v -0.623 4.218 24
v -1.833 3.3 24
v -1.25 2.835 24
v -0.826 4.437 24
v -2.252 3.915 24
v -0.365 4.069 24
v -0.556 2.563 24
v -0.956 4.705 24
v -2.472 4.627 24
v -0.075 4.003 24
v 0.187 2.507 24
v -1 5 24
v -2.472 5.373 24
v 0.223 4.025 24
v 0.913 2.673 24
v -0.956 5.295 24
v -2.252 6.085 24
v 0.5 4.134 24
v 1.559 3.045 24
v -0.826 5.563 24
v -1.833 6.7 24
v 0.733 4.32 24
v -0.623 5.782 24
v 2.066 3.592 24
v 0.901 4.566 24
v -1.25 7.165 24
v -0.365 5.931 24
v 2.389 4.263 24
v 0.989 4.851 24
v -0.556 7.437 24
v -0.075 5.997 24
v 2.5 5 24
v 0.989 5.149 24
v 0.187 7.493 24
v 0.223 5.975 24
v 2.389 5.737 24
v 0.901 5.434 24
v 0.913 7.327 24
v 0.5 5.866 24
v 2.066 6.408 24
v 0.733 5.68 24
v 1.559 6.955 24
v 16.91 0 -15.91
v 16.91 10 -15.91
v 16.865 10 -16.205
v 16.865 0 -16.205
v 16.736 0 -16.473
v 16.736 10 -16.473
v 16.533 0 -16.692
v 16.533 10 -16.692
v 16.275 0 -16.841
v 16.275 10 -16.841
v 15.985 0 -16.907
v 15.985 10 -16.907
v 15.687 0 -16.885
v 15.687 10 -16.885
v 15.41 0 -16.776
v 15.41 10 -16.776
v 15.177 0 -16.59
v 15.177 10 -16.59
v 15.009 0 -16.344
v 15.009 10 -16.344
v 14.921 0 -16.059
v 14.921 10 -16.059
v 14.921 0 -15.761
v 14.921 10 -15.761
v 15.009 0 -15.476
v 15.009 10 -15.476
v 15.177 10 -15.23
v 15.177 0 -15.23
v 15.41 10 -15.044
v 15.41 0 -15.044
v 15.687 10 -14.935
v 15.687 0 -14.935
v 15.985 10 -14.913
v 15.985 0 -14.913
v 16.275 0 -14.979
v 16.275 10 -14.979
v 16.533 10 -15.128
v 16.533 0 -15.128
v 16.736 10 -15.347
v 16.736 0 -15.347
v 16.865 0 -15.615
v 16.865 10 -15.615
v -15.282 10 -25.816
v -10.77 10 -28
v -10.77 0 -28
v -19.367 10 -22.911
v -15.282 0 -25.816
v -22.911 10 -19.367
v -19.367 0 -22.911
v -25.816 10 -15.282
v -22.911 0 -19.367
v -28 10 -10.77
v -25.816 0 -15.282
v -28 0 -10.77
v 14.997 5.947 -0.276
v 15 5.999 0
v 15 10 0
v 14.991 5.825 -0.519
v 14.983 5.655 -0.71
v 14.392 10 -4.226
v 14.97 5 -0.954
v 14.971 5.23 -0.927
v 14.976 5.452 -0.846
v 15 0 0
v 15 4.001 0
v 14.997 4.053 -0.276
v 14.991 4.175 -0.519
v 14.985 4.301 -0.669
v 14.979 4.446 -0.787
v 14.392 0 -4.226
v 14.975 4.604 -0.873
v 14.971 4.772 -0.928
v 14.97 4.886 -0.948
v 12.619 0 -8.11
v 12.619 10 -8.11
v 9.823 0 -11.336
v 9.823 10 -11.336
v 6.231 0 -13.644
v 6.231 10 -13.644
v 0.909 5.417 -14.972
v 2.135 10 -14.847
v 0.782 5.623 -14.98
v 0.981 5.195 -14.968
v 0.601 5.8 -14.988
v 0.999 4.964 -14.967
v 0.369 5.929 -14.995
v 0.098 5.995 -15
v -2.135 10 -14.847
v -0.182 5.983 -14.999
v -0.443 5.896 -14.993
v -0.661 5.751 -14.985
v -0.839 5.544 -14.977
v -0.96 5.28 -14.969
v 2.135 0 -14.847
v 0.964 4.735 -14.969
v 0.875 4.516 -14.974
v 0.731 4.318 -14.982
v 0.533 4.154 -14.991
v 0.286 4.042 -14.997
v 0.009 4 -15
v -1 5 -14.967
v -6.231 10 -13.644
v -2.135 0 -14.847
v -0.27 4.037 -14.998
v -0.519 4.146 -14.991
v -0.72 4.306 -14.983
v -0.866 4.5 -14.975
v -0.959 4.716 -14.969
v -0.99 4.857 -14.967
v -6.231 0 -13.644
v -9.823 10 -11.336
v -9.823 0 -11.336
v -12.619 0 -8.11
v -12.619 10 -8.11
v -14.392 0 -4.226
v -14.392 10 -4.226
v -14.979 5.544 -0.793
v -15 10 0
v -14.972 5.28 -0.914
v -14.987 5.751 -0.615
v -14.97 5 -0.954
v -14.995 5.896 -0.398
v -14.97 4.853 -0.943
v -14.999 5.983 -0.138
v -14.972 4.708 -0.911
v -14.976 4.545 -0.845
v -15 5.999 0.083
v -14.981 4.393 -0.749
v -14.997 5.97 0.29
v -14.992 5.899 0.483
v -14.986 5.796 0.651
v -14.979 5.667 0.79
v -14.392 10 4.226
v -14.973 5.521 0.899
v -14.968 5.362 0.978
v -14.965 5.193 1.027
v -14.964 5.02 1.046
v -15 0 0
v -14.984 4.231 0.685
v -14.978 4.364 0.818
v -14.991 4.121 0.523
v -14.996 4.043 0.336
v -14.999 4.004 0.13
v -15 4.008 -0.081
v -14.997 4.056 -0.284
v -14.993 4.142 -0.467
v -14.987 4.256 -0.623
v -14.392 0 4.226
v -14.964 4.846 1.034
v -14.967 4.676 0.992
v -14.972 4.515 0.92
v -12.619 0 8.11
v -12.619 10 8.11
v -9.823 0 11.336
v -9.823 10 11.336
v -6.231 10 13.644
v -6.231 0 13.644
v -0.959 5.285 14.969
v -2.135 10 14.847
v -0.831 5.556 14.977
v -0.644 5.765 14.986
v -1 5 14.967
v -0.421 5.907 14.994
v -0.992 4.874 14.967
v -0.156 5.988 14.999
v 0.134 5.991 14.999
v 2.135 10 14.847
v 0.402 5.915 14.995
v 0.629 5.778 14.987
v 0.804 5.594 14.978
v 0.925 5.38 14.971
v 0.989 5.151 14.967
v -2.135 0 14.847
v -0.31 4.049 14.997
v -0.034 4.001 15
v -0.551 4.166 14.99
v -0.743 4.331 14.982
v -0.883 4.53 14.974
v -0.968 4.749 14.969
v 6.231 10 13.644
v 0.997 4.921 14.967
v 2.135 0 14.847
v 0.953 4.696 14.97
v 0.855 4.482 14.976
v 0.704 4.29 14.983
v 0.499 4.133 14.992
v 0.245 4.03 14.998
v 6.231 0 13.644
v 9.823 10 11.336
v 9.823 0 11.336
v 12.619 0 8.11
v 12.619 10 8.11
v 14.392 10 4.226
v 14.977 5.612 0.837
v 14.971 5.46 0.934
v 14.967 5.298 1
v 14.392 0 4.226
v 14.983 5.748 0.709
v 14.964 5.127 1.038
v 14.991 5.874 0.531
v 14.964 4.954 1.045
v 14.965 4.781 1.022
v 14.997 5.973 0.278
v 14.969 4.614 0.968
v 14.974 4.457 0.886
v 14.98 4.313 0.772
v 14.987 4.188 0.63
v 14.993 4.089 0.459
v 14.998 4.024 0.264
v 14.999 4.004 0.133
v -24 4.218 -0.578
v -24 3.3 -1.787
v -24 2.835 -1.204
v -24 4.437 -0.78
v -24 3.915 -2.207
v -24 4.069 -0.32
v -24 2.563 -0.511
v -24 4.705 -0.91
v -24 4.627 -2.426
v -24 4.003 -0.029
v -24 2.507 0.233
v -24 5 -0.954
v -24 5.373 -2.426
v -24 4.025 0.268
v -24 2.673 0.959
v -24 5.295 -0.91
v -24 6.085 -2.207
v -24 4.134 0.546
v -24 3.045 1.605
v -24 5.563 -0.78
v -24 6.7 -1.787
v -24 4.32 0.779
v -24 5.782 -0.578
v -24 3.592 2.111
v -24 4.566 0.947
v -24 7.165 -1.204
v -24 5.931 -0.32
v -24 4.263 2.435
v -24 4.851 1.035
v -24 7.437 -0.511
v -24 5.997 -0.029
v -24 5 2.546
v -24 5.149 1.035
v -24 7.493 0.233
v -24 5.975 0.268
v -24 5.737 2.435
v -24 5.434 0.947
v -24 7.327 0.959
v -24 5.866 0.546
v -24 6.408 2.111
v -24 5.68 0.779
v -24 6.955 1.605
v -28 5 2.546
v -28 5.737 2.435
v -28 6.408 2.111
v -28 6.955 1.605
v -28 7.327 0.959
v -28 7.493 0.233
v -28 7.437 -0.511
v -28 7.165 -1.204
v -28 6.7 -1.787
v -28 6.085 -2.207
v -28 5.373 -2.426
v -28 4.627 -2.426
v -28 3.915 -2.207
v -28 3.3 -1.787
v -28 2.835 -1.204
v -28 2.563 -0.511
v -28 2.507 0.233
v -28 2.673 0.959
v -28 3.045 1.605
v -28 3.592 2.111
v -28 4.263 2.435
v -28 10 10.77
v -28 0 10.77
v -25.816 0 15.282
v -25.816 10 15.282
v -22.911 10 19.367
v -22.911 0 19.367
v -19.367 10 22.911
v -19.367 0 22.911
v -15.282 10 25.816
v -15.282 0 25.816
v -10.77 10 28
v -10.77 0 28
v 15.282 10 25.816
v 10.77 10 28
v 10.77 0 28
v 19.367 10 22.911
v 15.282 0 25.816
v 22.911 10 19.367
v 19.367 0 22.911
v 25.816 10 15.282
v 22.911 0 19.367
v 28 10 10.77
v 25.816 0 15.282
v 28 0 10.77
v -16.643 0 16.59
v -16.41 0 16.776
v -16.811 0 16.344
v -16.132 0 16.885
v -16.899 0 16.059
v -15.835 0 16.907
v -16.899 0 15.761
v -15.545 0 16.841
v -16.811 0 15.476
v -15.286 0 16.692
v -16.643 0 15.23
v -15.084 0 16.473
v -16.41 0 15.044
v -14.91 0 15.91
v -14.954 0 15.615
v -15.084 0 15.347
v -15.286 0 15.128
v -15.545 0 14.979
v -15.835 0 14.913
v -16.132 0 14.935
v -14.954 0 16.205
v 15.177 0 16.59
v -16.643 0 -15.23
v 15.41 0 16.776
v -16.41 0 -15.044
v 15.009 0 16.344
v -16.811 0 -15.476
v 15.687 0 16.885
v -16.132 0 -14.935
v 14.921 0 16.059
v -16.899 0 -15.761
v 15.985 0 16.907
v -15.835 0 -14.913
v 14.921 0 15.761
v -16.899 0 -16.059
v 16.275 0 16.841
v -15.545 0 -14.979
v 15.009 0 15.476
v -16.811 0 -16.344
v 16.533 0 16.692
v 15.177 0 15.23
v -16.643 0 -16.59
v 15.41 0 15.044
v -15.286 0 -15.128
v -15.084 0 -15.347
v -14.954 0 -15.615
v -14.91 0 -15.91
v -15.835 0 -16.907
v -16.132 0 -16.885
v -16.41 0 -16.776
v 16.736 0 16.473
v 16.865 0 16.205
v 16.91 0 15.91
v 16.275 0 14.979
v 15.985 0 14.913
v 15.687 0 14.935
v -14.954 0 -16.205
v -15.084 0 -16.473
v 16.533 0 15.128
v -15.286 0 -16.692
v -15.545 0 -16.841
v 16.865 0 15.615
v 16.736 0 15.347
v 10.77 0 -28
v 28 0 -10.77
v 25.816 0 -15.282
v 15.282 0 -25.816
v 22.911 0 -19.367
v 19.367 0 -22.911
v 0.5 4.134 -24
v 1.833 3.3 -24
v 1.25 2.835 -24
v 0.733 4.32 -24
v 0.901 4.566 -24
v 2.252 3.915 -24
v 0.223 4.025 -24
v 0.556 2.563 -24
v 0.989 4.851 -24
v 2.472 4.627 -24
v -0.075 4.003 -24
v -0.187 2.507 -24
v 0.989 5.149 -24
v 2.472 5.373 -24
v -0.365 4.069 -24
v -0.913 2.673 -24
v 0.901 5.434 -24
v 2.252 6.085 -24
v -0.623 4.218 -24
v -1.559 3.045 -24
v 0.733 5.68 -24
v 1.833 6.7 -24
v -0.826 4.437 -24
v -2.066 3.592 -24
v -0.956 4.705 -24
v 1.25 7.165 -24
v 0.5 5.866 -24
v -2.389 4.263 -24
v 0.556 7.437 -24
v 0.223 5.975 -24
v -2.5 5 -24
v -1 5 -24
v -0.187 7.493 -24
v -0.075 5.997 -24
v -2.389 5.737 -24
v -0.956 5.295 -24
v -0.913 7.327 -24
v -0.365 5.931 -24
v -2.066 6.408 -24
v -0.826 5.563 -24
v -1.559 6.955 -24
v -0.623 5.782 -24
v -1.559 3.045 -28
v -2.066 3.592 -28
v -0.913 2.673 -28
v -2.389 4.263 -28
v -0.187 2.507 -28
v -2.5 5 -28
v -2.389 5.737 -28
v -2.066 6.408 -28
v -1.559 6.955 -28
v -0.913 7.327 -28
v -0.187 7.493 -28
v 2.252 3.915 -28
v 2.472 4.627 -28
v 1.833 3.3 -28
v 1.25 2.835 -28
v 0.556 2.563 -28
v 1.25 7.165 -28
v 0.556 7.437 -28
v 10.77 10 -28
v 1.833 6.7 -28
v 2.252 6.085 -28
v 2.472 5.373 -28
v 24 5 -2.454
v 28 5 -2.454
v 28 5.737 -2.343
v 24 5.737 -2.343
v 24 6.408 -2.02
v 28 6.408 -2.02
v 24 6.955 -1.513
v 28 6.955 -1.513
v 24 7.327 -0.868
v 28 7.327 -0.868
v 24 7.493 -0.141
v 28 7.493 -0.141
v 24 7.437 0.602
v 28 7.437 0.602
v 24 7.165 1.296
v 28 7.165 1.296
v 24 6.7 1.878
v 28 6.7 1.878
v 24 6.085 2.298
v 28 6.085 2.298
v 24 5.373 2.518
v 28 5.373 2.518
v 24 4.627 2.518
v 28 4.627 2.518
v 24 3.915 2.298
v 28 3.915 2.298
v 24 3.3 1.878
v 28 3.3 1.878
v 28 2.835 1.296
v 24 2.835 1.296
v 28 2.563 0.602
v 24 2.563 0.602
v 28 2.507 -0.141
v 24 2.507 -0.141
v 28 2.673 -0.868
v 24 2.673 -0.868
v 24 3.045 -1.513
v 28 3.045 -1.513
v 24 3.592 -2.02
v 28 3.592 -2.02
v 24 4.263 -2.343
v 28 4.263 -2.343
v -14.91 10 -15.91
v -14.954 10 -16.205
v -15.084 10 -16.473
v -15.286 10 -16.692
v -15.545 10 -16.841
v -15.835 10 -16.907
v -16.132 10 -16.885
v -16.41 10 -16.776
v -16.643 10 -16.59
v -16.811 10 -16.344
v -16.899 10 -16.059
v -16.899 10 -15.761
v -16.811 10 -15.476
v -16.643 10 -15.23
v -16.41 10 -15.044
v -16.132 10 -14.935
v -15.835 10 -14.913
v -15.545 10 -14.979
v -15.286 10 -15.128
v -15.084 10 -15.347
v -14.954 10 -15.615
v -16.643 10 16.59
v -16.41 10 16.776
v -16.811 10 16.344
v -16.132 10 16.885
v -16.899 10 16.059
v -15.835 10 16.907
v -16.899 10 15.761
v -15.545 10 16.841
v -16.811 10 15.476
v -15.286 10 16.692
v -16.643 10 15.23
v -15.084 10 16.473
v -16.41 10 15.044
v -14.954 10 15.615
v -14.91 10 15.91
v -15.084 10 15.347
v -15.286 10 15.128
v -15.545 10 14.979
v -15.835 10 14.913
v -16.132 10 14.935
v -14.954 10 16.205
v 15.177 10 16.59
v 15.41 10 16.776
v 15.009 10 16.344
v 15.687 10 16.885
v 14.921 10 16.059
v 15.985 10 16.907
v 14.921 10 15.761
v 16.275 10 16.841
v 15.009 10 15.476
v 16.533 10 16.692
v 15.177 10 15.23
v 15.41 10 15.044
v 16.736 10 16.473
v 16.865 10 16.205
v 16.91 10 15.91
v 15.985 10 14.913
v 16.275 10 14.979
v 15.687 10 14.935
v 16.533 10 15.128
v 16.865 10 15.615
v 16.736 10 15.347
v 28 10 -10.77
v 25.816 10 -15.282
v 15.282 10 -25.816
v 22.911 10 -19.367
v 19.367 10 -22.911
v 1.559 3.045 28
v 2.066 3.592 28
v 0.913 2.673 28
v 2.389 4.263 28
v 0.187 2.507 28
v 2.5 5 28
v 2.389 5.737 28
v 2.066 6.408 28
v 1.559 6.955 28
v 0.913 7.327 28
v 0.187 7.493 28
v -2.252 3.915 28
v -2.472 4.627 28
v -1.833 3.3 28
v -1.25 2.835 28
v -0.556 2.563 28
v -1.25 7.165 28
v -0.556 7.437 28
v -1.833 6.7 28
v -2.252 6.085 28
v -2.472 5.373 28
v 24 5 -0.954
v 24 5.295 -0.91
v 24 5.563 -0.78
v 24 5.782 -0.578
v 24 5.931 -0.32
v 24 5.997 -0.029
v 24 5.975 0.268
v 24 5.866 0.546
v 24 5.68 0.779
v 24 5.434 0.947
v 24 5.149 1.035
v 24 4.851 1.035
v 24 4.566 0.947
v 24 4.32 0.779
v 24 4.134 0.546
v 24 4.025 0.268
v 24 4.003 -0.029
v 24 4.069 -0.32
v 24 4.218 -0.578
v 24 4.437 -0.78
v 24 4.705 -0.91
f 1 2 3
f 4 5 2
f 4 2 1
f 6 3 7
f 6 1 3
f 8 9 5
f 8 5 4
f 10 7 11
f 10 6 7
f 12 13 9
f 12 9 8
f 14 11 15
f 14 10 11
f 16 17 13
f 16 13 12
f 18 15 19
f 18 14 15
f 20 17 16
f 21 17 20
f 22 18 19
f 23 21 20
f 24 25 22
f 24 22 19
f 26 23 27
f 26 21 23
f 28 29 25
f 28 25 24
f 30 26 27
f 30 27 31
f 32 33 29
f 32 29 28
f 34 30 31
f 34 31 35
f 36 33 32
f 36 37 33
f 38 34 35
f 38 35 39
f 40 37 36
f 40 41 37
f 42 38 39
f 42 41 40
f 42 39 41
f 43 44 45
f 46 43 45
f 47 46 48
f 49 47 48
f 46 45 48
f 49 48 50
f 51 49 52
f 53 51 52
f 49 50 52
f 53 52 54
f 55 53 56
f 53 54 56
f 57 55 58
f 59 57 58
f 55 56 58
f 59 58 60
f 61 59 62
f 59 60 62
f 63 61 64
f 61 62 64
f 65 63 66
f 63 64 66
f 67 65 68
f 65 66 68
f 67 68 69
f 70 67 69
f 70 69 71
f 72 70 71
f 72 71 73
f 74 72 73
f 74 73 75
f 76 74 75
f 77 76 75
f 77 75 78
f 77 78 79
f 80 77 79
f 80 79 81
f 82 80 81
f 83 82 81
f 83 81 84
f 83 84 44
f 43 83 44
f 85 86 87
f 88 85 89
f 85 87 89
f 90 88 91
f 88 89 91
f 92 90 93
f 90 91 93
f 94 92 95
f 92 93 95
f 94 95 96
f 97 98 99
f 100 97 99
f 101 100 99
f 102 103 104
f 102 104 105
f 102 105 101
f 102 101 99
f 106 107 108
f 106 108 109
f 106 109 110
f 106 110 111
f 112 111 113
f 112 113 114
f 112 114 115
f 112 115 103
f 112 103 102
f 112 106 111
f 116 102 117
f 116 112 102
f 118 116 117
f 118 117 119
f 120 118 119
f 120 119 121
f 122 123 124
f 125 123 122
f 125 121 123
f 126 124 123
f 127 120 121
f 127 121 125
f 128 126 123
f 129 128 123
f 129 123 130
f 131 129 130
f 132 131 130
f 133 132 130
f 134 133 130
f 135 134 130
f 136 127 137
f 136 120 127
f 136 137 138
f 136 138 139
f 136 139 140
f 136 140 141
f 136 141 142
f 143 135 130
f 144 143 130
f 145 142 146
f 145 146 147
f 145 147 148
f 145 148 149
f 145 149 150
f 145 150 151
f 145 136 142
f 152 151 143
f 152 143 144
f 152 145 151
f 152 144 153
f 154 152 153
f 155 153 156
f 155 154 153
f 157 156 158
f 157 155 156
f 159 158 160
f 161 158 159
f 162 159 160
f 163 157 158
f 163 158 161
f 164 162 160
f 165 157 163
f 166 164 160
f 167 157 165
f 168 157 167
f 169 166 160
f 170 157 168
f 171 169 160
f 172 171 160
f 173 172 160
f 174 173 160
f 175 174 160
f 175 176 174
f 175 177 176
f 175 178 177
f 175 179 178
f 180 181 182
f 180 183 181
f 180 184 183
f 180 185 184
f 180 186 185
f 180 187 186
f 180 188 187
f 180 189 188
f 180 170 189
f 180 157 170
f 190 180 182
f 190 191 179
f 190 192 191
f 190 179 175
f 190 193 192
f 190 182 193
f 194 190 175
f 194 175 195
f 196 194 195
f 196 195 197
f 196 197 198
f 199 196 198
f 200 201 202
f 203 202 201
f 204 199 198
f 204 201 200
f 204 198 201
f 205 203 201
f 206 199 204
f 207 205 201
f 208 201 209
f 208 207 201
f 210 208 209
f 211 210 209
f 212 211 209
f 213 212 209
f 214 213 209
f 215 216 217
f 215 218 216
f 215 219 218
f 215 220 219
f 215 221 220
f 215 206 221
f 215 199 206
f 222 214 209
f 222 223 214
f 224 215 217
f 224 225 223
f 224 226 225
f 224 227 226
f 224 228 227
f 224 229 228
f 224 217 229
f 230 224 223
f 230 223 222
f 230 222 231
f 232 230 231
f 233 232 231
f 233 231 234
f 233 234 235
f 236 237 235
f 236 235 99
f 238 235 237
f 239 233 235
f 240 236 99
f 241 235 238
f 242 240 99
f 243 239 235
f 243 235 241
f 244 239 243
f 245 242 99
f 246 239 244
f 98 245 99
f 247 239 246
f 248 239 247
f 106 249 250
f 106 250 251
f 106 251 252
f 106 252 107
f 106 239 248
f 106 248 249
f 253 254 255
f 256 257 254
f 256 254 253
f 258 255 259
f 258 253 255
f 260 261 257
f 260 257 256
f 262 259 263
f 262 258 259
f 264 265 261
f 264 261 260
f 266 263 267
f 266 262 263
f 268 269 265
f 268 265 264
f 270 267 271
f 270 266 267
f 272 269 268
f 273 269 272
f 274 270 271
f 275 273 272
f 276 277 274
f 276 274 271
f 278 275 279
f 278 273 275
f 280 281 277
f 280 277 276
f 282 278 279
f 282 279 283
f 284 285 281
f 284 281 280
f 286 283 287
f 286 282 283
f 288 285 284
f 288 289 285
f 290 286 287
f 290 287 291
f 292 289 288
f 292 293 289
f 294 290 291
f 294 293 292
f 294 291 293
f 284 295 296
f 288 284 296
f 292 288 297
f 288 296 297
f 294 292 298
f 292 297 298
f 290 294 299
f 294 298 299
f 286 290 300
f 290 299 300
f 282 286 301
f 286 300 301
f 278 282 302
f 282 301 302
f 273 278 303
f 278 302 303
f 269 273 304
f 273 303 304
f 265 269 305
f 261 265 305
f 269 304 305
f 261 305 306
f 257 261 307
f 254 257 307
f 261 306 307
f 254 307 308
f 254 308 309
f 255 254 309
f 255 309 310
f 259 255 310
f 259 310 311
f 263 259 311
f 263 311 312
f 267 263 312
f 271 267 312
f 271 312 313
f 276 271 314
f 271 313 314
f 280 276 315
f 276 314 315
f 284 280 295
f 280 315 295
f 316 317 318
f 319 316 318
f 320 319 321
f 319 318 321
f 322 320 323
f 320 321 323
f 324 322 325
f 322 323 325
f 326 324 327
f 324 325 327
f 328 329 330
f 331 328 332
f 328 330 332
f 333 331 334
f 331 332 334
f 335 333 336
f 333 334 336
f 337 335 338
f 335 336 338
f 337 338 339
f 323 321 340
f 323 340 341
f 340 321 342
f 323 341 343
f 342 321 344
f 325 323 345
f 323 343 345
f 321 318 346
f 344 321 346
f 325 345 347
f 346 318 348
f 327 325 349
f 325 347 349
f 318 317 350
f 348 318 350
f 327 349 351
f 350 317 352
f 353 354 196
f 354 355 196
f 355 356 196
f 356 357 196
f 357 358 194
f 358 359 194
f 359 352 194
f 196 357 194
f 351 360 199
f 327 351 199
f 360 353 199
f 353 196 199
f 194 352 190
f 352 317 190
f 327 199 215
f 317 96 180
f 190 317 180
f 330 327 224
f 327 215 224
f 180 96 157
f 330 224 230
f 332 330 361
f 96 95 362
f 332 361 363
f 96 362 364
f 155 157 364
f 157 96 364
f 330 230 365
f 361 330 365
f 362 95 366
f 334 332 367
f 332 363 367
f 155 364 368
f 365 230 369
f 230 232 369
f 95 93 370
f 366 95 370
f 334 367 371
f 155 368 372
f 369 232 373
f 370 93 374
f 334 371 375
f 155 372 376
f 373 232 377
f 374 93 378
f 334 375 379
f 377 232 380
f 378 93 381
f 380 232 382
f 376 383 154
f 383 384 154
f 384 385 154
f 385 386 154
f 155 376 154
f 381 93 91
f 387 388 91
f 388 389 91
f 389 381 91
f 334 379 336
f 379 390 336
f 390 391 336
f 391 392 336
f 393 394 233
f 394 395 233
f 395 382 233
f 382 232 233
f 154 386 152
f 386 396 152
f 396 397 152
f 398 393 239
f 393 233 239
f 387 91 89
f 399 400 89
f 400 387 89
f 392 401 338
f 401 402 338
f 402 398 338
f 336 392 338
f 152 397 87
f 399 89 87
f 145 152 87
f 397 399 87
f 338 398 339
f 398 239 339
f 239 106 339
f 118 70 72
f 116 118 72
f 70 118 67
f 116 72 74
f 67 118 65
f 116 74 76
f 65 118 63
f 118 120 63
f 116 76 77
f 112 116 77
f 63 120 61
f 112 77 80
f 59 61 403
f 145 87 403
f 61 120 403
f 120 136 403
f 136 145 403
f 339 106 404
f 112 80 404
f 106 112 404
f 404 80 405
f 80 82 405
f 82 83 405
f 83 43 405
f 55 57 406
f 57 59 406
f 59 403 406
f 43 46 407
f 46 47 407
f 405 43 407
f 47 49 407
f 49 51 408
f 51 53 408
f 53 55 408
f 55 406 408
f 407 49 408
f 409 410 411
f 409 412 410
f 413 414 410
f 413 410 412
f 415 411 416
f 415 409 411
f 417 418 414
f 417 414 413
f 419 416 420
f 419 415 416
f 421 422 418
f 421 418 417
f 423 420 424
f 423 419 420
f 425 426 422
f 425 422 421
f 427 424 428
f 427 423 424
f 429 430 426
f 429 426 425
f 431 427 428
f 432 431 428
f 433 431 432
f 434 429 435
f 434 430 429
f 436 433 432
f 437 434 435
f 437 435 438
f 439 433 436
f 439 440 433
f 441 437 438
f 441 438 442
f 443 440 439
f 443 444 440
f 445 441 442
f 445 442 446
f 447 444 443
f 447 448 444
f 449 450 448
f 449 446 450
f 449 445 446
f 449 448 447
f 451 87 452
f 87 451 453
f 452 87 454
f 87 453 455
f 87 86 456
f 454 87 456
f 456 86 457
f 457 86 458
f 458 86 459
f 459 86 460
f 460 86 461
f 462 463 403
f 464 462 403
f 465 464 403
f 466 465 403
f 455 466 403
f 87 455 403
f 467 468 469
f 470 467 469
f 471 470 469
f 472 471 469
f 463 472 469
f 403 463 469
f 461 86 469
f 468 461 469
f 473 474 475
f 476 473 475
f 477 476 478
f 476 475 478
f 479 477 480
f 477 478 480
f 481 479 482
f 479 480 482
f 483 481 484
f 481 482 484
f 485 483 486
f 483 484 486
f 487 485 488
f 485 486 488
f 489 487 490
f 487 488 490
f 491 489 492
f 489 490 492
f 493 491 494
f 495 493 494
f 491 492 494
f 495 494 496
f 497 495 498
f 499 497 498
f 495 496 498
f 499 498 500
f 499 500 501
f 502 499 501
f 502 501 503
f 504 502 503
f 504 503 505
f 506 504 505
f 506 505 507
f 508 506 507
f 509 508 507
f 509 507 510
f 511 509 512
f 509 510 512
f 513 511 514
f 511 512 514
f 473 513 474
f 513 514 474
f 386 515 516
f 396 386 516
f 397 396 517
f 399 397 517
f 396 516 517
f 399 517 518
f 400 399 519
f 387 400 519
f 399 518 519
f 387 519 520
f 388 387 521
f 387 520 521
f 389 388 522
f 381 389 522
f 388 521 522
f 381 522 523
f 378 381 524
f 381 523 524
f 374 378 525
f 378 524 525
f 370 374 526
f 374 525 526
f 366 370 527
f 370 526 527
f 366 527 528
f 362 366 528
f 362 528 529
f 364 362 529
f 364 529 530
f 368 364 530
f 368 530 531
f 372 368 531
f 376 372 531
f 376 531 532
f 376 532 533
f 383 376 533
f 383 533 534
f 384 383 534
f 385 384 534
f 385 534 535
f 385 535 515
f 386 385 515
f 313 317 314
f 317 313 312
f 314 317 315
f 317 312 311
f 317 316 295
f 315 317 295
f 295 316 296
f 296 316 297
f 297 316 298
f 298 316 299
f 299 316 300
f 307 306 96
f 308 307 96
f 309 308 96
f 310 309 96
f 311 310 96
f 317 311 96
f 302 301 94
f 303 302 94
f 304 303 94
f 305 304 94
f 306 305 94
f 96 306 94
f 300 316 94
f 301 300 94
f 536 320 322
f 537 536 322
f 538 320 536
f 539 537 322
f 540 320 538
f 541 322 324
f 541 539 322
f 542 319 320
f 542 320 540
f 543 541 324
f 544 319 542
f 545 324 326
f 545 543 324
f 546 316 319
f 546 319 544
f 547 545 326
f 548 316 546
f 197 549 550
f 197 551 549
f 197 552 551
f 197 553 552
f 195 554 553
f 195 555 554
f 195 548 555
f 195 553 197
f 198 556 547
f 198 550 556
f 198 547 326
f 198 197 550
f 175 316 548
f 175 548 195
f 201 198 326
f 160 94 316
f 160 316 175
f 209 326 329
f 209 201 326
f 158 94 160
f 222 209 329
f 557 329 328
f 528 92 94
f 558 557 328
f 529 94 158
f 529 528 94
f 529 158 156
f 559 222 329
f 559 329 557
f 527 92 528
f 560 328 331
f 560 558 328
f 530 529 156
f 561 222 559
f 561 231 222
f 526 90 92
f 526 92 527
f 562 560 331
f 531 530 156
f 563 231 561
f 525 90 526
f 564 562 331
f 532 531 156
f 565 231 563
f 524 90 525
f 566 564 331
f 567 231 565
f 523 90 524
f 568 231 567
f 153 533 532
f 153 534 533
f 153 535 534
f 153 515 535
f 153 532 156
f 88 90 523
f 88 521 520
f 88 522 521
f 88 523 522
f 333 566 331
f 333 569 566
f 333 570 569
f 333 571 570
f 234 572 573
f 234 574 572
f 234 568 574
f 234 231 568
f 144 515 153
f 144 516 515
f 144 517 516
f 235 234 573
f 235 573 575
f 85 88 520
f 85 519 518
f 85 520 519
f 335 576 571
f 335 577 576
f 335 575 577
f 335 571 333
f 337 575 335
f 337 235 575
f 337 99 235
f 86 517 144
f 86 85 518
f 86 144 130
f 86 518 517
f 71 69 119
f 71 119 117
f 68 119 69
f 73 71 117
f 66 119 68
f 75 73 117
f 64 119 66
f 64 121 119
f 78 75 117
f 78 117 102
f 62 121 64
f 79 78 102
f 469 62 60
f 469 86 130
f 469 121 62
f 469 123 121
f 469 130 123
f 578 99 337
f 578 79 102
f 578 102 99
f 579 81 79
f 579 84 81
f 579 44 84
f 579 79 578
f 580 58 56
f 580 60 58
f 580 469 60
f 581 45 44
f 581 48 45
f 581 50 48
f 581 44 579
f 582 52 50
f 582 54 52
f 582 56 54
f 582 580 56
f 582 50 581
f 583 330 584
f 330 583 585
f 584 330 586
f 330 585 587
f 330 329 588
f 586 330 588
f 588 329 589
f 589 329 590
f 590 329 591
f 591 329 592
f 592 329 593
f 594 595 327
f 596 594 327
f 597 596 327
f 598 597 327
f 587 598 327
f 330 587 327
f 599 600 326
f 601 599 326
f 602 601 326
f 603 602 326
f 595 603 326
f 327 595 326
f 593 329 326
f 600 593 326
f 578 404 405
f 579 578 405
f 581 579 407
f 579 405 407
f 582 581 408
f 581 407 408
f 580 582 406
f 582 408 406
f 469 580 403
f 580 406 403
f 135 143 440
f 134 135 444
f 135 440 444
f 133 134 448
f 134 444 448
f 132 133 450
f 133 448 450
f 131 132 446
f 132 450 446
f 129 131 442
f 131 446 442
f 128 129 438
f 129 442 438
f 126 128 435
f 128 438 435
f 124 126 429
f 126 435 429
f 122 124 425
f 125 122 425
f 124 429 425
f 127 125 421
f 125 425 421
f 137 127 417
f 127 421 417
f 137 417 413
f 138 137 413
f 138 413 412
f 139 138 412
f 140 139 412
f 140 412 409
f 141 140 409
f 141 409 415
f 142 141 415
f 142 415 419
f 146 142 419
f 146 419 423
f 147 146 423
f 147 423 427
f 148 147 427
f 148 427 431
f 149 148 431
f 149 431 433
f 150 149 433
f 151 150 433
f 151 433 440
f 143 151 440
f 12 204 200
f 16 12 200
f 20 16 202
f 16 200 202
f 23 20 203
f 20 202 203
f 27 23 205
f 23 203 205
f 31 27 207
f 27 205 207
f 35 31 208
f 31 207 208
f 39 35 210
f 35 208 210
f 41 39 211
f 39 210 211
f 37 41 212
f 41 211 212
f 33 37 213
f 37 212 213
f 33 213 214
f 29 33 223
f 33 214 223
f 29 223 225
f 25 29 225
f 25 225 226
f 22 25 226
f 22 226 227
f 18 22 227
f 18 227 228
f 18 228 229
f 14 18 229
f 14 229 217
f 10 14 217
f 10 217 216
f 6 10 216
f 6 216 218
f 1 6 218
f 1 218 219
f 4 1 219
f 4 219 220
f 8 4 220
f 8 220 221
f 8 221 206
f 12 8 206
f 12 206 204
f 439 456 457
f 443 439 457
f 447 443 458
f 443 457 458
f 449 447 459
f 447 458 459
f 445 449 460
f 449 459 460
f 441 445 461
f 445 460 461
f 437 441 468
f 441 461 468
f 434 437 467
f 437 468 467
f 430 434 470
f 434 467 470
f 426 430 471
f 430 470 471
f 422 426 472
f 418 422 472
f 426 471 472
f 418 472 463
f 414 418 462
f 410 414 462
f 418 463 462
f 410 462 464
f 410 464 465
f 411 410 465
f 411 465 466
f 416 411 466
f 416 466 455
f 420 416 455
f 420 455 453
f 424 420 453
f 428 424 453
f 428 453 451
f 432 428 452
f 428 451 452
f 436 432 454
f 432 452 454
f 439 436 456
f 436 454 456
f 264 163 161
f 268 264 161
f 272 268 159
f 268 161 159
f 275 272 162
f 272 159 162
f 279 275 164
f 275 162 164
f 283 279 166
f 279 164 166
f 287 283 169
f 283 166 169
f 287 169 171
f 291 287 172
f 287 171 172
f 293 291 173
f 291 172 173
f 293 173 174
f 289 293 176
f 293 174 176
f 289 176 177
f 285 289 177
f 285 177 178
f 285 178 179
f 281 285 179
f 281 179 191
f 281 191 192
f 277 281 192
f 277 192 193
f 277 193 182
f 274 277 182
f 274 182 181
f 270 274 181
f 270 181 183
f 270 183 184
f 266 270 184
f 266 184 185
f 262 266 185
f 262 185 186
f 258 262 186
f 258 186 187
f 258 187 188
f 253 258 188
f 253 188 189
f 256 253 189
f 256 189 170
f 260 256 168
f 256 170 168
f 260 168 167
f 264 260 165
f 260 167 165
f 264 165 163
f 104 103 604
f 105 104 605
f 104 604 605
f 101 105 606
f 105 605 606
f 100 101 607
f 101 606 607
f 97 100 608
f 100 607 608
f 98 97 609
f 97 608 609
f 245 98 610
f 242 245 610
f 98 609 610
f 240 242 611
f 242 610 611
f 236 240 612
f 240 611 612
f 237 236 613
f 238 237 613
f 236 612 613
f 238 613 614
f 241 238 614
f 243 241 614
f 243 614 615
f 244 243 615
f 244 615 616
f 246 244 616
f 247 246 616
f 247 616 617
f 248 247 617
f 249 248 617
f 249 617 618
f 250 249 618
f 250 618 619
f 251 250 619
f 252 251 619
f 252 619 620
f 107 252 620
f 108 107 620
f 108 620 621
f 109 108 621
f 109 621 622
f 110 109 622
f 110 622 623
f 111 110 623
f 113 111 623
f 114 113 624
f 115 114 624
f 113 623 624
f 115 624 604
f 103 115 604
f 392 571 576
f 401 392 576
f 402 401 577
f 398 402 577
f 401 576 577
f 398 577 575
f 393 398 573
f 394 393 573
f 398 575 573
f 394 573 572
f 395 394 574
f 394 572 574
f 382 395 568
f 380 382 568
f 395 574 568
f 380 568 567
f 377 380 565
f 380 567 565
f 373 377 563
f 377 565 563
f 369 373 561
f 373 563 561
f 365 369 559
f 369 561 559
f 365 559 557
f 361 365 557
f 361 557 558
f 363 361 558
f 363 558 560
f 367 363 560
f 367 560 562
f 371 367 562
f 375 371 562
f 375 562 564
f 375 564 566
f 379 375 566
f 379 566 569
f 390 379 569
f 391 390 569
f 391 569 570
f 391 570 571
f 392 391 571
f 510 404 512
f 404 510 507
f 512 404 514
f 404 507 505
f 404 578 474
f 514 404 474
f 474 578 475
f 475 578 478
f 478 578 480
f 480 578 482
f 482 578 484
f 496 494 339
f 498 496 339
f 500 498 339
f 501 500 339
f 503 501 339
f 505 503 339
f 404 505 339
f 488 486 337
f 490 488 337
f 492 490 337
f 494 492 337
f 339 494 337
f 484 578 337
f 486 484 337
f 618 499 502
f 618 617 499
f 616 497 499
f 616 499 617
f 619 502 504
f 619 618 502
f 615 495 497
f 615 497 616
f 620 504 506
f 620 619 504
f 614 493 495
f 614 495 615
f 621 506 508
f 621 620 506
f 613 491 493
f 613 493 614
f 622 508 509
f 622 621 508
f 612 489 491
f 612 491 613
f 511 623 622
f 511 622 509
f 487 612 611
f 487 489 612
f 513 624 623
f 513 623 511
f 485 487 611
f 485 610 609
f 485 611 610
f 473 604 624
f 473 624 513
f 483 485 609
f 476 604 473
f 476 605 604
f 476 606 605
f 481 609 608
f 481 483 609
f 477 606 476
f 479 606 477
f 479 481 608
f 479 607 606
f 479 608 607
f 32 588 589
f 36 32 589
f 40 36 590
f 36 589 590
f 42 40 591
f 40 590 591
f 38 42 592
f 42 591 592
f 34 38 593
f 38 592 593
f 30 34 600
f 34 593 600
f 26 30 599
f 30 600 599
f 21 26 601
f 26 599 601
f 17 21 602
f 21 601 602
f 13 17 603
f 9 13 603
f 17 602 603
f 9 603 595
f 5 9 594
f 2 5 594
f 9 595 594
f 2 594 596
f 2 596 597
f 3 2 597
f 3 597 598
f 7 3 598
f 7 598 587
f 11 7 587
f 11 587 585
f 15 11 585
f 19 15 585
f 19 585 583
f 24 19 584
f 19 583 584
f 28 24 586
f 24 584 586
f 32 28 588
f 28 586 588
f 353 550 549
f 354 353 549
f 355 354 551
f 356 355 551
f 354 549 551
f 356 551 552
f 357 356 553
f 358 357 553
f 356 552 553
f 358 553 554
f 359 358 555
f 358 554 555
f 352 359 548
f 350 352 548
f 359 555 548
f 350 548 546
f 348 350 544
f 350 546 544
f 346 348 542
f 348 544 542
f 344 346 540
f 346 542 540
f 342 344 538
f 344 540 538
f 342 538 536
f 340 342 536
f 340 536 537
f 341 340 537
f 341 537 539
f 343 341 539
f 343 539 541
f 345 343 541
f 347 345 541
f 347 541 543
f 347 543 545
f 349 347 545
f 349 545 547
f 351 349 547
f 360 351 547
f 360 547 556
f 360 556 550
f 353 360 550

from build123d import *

# Parameters (mm, degrees)
SKETCH1_R           = 30
SKETCH1_R_2         = 15
BOSS_EXTRUDE1_DEPTH = 10
CUT_EXTRUDE1_DEPTH  = 43
SKETCH4_R           = 1
CUT_EXTRUDE3_DEPTH  = 43
SKETCH5_R           = 1
CUT_EXTRUDE4_DEPTH  = 70
SKETCH6_R           = 1
CUT_EXTRUDE5_DEPTH  = 70
SKETCH8_R           = 2.5
CUT_EXTRUDE6_DEPTH  = 4
SKETCH9_R           = 2.5
SKETCH9_R_2         = 1
CUT_EXTRUDE7_DEPTH  = 4
SKETCH10_R          = 2.5
CUT_EXTRUDE8_DEPTH  = 4
SKETCH11_R          = 2.5
CUT_EXTRUDE9_DEPTH  = 4


with BuildPart() as part:
    # Sketch1 → Boss-Extrude1 (new body)
    with BuildSketch(Plane(origin=(0, 0, 0), x_dir=(1, 0, 0), z_dir=(0, 1, 0))):
        Circle(SKETCH1_R)
        Circle(SKETCH1_R_2, mode=Mode.SUBTRACT)
    extrude(amount=BOSS_EXTRUDE1_DEPTH)

    # Sketch2 → Cut-Extrude1 (cut)
    with BuildSketch(Plane(origin=(0, 10, 0), x_dir=(1, 0, 0), z_dir=(0, 1, 0))):
        with BuildLine():
            ThreePointArc((10.770329614, 28), (0, 30), (-10.770329614, 28))
            Line((-10.770329614, 28), (10.770329614, 28))
        make_face()
        with BuildLine():
            Line((-28, -10.770329614), (-28, 10.770329614))
            ThreePointArc((-28, 10.770329614), (-30, 0), (-28, -10.770329614))
        make_face()
        with BuildLine():
            ThreePointArc((30, 0), (29.495762408, 5.477225575), (28, 10.770329614))
            Line((28, 10.770329614), (28, -10.770329614))
            ThreePointArc((28, -10.770329614), (29.495762408, -5.477225575), (30, 0))
        make_face()
        with BuildLine():
            Line((10.770329614, -28), (-10.770329614, -28))
            ThreePointArc((-10.770329614, -28), (0, -30), (10.770329614, -28))
        make_face()
    extrude(amount=-CUT_EXTRUDE1_DEPTH, mode=Mode.SUBTRACT)

    # Sketch4 → Cut-Extrude3 (cut)
    with BuildSketch(Plane(origin=(0, 10, 0), x_dir=(1, 0, 0), z_dir=(0, 1, 0))):
        with Locations((15.909902577, -15.909902577)):
            Circle(SKETCH4_R)
        with Locations((-15.909902577, -15.909902577)):
            Circle(SKETCH4_R)
        with Locations((-15.909902577, 15.909902577)):
            Circle(SKETCH4_R)
        with Locations((15.909902577, 15.909902577)):
            Circle(SKETCH4_R)
    extrude(amount=-CUT_EXTRUDE3_DEPTH, mode=Mode.SUBTRACT)

    # Sketch5 → Cut-Extrude4 (cut)
    with BuildSketch(Plane(origin=(0, 0, -28), x_dir=(-1, 0, 0), z_dir=(0, 0, -1))):
        with Locations((0, 5)):
            Circle(SKETCH5_R)
    extrude(amount=-CUT_EXTRUDE4_DEPTH, mode=Mode.SUBTRACT)

    # Sketch6 → Cut-Extrude5 (cut)
    with BuildSketch(Plane(origin=(28, 0, 0), x_dir=(0, 0, -1), z_dir=(1, 0, 0))):
        with Locations((-0.045783142, 5)):
            Circle(SKETCH6_R)
    extrude(amount=-CUT_EXTRUDE5_DEPTH, mode=Mode.SUBTRACT)

    # Sketch8 → Cut-Extrude6 (cut)
    with BuildSketch(Plane(origin=(0, 0, -28), x_dir=(-1, 0, 0), z_dir=(0, 0, -1))):
        with Locations((0, 5)):
            Circle(SKETCH8_R)
    extrude(amount=-CUT_EXTRUDE6_DEPTH, mode=Mode.SUBTRACT)

    # Sketch9 → Cut-Extrude7 (cut)
    with BuildSketch(Plane(origin=(28, 0, 0), x_dir=(0, 0, -1), z_dir=(1, 0, 0))):
        with Locations((-0.045783142, 5)):
            Circle(SKETCH9_R)
        with Locations((-0.045783142, 5)):
            Circle(SKETCH9_R_2, mode=Mode.SUBTRACT)
    extrude(amount=-CUT_EXTRUDE7_DEPTH, mode=Mode.SUBTRACT)

    # Sketch10 → Cut-Extrude8 (cut)
    with BuildSketch(Plane.XY.offset(28)):
        with Locations((0, 5)):
            Circle(SKETCH10_R)
    extrude(amount=-CUT_EXTRUDE8_DEPTH, mode=Mode.SUBTRACT)

    # Sketch11 → Cut-Extrude9 (cut)
    with BuildSketch(Plane.ZY.offset(28)):
        with Locations((0.045783142, 5)):
            Circle(SKETCH11_R)
    extrude(amount=-CUT_EXTRUDE9_DEPTH, mode=Mode.SUBTRACT)


solid = part.part
